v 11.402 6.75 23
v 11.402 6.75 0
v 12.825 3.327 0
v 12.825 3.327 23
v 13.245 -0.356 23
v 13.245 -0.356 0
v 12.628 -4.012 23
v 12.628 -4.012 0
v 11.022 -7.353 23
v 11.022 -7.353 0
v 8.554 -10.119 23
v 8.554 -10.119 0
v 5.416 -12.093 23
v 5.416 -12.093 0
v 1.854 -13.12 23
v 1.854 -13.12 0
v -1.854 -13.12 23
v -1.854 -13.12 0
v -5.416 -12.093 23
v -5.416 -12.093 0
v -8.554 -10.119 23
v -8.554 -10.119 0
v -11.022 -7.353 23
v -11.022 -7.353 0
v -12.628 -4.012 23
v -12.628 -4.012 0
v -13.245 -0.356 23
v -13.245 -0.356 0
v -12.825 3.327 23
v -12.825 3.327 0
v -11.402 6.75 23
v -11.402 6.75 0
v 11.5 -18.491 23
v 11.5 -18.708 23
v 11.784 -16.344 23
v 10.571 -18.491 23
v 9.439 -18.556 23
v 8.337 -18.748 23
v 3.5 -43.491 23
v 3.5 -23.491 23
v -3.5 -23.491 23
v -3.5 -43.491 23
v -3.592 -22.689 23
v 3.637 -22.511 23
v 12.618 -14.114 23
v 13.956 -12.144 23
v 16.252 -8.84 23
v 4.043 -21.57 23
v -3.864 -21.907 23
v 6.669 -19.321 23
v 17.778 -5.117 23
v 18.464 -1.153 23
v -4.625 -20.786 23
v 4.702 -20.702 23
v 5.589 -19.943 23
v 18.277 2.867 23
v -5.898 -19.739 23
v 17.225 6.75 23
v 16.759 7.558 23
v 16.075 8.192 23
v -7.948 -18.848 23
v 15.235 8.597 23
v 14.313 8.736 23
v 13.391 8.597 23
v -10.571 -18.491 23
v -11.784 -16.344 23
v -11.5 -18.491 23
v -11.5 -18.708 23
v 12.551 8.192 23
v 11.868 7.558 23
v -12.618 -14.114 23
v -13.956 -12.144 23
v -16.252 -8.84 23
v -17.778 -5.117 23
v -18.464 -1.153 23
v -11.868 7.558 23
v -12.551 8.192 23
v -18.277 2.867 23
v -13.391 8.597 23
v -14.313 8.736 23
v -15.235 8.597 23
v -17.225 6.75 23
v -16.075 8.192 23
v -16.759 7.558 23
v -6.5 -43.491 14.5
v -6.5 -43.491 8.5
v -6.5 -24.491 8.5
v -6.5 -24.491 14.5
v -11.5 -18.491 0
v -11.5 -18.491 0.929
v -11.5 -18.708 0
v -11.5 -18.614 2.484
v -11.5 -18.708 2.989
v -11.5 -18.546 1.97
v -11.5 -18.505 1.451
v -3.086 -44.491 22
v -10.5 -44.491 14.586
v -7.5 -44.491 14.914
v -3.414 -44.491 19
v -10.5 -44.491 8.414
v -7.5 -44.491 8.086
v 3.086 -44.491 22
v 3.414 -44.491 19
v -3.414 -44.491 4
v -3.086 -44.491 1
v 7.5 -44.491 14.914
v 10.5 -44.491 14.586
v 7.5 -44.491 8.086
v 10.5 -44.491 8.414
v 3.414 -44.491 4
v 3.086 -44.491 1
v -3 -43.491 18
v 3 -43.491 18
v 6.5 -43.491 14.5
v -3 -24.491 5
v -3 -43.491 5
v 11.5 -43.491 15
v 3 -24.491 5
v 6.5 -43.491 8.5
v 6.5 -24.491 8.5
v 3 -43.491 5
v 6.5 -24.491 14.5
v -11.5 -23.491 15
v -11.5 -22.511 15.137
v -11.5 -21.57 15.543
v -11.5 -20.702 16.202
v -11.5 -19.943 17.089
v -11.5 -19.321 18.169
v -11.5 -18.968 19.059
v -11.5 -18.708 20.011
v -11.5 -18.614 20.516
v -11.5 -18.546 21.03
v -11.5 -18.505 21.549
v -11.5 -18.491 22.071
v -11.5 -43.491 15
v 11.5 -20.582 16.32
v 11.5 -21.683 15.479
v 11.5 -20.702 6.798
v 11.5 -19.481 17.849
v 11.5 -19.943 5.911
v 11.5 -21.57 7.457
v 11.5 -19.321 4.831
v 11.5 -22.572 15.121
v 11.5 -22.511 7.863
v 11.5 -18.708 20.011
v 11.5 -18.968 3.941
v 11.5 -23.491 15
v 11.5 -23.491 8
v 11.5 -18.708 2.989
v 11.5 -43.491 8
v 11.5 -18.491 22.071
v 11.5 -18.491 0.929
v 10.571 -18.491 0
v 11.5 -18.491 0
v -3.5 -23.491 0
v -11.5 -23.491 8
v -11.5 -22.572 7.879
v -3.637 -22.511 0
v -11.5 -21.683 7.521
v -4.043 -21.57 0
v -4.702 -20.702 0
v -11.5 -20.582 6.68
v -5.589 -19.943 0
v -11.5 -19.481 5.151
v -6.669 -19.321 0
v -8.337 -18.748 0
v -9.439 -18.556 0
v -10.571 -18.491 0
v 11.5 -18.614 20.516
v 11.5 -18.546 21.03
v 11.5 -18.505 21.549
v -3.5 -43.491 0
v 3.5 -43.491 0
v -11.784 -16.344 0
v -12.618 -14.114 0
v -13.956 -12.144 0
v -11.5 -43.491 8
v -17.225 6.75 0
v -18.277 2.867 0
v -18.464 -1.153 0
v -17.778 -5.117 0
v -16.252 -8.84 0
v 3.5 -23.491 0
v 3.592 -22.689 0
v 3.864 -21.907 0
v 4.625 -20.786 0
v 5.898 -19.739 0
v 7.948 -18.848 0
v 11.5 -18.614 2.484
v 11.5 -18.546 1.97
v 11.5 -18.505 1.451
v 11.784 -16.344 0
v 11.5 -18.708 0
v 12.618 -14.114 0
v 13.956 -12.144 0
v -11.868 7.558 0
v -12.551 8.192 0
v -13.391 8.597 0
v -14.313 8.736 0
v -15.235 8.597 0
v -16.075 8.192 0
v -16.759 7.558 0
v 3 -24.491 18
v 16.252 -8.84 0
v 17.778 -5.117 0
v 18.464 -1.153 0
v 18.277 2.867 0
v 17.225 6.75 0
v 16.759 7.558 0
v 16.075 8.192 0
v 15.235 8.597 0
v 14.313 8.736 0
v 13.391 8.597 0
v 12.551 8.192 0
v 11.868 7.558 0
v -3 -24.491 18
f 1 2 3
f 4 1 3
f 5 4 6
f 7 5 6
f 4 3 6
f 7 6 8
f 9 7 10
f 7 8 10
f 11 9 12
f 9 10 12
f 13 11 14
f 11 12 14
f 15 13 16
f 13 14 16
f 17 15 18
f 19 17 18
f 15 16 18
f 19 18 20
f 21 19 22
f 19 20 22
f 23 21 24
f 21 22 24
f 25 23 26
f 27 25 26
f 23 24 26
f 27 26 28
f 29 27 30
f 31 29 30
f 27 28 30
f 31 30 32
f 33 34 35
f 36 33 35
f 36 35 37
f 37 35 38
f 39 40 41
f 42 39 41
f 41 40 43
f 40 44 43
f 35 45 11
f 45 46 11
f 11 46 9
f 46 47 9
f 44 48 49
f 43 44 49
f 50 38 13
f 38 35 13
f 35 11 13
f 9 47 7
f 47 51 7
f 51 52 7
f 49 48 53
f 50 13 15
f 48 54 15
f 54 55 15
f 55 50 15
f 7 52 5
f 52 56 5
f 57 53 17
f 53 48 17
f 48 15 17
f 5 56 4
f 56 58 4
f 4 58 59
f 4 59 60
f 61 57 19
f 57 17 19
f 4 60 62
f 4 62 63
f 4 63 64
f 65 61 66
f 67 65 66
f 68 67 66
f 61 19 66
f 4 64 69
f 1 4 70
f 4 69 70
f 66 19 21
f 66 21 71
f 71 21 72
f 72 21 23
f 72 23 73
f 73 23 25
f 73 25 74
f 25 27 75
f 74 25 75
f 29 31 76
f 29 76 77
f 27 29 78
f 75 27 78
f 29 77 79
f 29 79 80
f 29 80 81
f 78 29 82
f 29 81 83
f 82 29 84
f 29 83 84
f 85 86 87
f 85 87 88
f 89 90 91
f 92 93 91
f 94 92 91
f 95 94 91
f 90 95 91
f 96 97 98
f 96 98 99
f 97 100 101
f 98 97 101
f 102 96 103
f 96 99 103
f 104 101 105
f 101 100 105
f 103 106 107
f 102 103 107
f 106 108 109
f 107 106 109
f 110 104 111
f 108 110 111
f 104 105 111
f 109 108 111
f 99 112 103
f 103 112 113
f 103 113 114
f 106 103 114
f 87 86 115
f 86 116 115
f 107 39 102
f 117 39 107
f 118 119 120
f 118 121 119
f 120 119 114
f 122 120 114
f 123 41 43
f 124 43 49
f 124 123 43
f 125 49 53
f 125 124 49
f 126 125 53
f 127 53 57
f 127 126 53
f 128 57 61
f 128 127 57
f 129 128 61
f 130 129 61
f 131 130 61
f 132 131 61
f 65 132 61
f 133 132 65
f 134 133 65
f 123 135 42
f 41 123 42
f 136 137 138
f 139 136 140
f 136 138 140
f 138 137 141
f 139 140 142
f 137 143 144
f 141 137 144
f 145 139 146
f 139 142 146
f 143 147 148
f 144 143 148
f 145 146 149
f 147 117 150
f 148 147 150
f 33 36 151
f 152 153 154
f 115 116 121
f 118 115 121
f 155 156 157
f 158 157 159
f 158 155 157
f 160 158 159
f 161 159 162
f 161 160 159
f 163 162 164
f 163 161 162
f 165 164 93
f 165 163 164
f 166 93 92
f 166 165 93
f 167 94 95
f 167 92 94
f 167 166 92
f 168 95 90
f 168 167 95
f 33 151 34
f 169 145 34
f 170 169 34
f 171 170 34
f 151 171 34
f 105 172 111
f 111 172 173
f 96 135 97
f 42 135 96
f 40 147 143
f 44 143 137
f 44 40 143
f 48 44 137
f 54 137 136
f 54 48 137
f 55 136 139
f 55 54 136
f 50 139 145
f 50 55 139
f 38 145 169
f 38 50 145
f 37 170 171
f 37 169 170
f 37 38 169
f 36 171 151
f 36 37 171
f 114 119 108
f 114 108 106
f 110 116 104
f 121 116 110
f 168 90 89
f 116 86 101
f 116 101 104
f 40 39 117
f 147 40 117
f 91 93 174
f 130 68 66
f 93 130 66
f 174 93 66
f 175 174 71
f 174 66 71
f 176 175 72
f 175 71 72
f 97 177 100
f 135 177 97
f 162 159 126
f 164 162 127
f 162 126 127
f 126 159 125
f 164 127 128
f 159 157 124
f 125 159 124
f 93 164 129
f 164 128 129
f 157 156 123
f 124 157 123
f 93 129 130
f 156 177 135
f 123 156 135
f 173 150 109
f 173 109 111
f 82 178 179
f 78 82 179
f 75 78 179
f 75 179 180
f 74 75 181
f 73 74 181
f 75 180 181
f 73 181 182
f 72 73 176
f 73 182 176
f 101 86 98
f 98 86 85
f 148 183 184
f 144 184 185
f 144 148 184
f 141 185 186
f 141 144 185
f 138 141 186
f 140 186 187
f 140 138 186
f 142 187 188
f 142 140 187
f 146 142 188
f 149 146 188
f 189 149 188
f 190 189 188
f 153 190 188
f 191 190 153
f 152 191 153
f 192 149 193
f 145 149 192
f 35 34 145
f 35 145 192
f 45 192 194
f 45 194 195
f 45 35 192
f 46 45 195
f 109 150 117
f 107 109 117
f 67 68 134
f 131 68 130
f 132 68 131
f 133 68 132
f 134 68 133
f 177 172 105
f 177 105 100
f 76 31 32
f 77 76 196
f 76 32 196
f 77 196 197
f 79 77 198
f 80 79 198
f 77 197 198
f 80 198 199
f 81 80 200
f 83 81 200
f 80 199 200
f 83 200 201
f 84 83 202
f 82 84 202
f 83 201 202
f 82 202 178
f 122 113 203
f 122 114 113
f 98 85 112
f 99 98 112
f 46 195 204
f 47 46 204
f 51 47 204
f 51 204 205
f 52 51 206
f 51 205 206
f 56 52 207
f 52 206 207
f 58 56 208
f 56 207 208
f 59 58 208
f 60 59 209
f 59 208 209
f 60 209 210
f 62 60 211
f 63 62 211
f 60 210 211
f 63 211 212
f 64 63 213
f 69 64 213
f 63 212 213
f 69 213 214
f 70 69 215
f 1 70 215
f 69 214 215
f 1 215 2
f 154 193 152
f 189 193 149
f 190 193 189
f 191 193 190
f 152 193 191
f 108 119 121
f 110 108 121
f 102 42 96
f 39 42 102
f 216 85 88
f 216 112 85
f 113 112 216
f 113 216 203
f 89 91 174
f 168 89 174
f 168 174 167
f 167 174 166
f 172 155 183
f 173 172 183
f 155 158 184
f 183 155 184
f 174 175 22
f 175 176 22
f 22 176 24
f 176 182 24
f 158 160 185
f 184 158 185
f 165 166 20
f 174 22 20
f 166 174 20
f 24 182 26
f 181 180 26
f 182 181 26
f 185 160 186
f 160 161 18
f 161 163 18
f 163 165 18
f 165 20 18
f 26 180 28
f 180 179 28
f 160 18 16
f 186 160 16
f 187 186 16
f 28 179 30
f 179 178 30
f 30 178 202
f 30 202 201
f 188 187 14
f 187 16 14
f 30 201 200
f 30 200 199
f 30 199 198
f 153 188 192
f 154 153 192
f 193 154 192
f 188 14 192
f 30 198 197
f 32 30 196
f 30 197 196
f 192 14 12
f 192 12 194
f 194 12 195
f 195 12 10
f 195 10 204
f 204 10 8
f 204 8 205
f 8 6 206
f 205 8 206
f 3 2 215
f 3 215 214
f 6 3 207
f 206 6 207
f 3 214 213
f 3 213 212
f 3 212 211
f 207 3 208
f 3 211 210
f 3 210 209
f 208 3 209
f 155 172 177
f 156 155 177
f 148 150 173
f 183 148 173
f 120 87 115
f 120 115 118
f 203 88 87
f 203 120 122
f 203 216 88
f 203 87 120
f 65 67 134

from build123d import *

# Parameters (mm, degrees)
BOSS_EXTRUDE1_DEPTH = 23
FILLET1_R           = 10
SKETCH2_W           = 13
SKETCH2_H           = 13
CUT_EXTRUDE1_DEPTH  = 20
CHAMFER2_SIZE       = 3.5
CUT_EXTRUDE2_DEPTH  = 26
CHAMFER3_SIZE       = 1
FILLET2_R           = 5


with BuildPart() as part:
    # Sketch1 → Boss-Extrude1 (new body)
    with BuildSketch(Plane.XY):
        with BuildLine():
            Line((-11.5, -14.491376746), (-11.5, -44.491376746))
            Line((-11.5, -44.491376746), (11.5, -44.491376746))
            Line((11.5, -44.491376746), (11.5, -14.491376746))
            ThreePointArc((11.5, -14.491376746), (17.862669336, -4.814046549), (17.224619009, 6.75))
            ThreePointArc((17.224619009, 6.75), (14.31318663, 8.736071822), (11.401754251, 6.75))
            ThreePointArc((11.401754251, 6.75), (0, -13.25), (-11.401754251, 6.75))
            ThreePointArc((-11.401754251, 6.75), (-14.31318663, 8.736071822), (-17.224619009, 6.75))
            ThreePointArc((-17.224619009, 6.75), (-17.862669336, -4.814046549), (-11.5, -14.491376746))
        make_face()
    extrude(amount=BOSS_EXTRUDE1_DEPTH)

    # Fillet1
    fillet1_edges = [part.edges().sort_by_distance(p)[0] for p in [
        (-11.5, -14.491376746, 11.5),
        (11.5, -14.491376746, 11.5),
    ]]
    fillet(fillet1_edges, radius=FILLET1_R)

    # Sketch2 → Cut-Extrude1 (cut)
    with BuildSketch(Plane.XZ.offset(44.491376746)):
        with Locations((0, 11.5)):
            Rectangle(SKETCH2_W, SKETCH2_H)
    extrude(amount=-CUT_EXTRUDE1_DEPTH, mode=Mode.SUBTRACT)

    # Chamfer2
    chamfer2_edges = [part.edges().sort_by_distance(p)[0] for p in [
        (-6.5, -34.491376746, 5),
        (-6.5, -34.491376746, 18),
        (6.5, -34.491376746, 18),
        (6.5, -34.491376746, 5),
    ]]
    chamfer(chamfer2_edges, length=CHAMFER2_SIZE)

    # Sketch3 → Cut-Extrude2 (cut)
    with BuildSketch(Plane.XZ.offset(44.491376746)):
        Polygon((-11.5, 15), (-3.5, 23), (-11.5, 23), align=None)
        Polygon((3.5, 23), (11.5, 15), (11.5, 23), align=None)
        Polygon((11.5, 0), (11.5, 8), (3.5, 0), align=None)
        Polygon((-11.5, 0), (-3.5, 0), (-11.5, 8), align=None)
    extrude(amount=-CUT_EXTRUDE2_DEPTH, mode=Mode.SUBTRACT)

    # Chamfer3
    chamfer3_edges = [part.edges().sort_by_distance(p)[0] for p in [
        (7.5, -44.491376746, 4),
        (7.5, -44.491376746, 19),
        (-7.5, -44.491376746, 19),
        (0, -44.491376746, 5),
        (-6.5, -44.491376746, 11.5),
        (6.5, -44.491376746, 11.5),
        (0, -44.491376746, 18),
        (-4.75, -44.491376746, 6.75),
        (4.75, -44.491376746, 6.75),
        (4.75, -44.491376746, 16.25),
        (-4.75, -44.491376746, 16.25),
        (0, -44.491376746, 0),
        (0, -44.491376746, 23),
        (11.5, -44.491376746, 11.5),
        (-11.5, -44.491376746, 11.5),
        (-7.5, -44.491376746, 4),
    ]]
    chamfer(chamfer3_edges, length=CHAMFER3_SIZE)

    # Fillet2
    # the kernel refuses this fillet: 5 mm, written as the material it adds along each edge
    with BuildSketch(Plane(origin=(20.338834765, -18.491376746, 16.838834765), x_dir=(0, -1, 0), z_dir=(-0.7071067811865476, 0, -0.7071067811865476))) as fillet2_piece_1_section:
        with BuildLine():
            CenterArc((FILLET2_R, -FILLET2_R), FILLET2_R, 90, 90)
            Line((0, -FILLET2_R), (0, 0))
            Line((0, 0), (FILLET2_R, 0))
        make_face()
    fillet2_piece_1 = extrude(amount=36.313708499, mode=Mode.PRIVATE)
    fillet2_piece_1 = split(fillet2_piece_1, bisect_by=Plane(origin=(11.5, -19.775050917, 3.381146021), z_dir=(-1, 0, 0)), keep=Keep.TOP, mode=Mode.PRIVATE)
    fillet2_piece_1 = split(fillet2_piece_1, bisect_by=Plane(origin=(8.118853979, -19.775050917, 0), z_dir=(0, 0, 1)), keep=Keep.TOP, mode=Mode.PRIVATE)
    add(fillet2_piece_1)
    with BuildSketch(Plane(origin=(-5.338834765, -18.491376746, 31.838834765), x_dir=(0, -1, 0), z_dir=(0.7071067811865476, 0, -0.7071067811865476))) as fillet2_piece_2_section:
        with BuildLine():
            CenterArc((FILLET2_R, -FILLET2_R), FILLET2_R, 90, 90)
            Line((0, -FILLET2_R), (0, 0))
            Line((0, 0), (FILLET2_R, 0))
        make_face()
    fillet2_piece_2 = extrude(amount=36.313708499, mode=Mode.PRIVATE)
    fillet2_piece_2 = split(fillet2_piece_2, bisect_by=Plane(origin=(8.118853979, -19.775050917, 23), z_dir=(0, 0, -1)), keep=Keep.TOP, mode=Mode.PRIVATE)
    fillet2_piece_2 = split(fillet2_piece_2, bisect_by=Plane(origin=(11.5, -19.775050917, 19.618853979), z_dir=(-1, 0, 0)), keep=Keep.TOP, mode=Mode.PRIVATE)
    add(fillet2_piece_2)
    with BuildSketch(Plane(origin=(-20.338834765, -18.491376746, 6.161165235), x_dir=(0, -1, 0), z_dir=(0.7071067811865476, 0, 0.7071067811865476))) as fillet2_piece_3_section:
        with BuildLine():
            CenterArc((FILLET2_R, -FILLET2_R), FILLET2_R, 90, 90)
            Line((0, -FILLET2_R), (0, 0))
            Line((0, 0), (FILLET2_R, 0))
        make_face()
    fillet2_piece_3 = extrude(amount=36.313708499, mode=Mode.PRIVATE)
    fillet2_piece_3 = split(fillet2_piece_3, bisect_by=Plane(origin=(-8.118853979, -19.775050917, 23), z_dir=(0, 0, -1)), keep=Keep.TOP, mode=Mode.PRIVATE)
    fillet2_piece_3 = split(fillet2_piece_3, bisect_by=Plane(origin=(-11.5, -19.775050917, 19.618853979), z_dir=(1, 0, 0)), keep=Keep.TOP, mode=Mode.PRIVATE)
    add(fillet2_piece_3)
    with BuildSketch(Plane(origin=(5.338834765, -18.491376746, -8.838834765), x_dir=(0, -1, 0), z_dir=(-0.7071067811865476, 0, 0.7071067811865476))) as fillet2_piece_4_section:
        with BuildLine():
            CenterArc((FILLET2_R, -FILLET2_R), FILLET2_R, 90, 90)
            Line((0, -FILLET2_R), (0, 0))
            Line((0, 0), (FILLET2_R, 0))
        make_face()
    fillet2_piece_4 = extrude(amount=36.313708499, mode=Mode.PRIVATE)
    fillet2_piece_4 = split(fillet2_piece_4, bisect_by=Plane(origin=(-8.118853979, -19.775050917, 0), z_dir=(0, 0, 1)), keep=Keep.TOP, mode=Mode.PRIVATE)
    fillet2_piece_4 = split(fillet2_piece_4, bisect_by=Plane(origin=(-11.5, -19.775050917, 3.381146021), z_dir=(1, 0, 0)), keep=Keep.TOP, mode=Mode.PRIVATE)
    add(fillet2_piece_4)


solid = part.part
